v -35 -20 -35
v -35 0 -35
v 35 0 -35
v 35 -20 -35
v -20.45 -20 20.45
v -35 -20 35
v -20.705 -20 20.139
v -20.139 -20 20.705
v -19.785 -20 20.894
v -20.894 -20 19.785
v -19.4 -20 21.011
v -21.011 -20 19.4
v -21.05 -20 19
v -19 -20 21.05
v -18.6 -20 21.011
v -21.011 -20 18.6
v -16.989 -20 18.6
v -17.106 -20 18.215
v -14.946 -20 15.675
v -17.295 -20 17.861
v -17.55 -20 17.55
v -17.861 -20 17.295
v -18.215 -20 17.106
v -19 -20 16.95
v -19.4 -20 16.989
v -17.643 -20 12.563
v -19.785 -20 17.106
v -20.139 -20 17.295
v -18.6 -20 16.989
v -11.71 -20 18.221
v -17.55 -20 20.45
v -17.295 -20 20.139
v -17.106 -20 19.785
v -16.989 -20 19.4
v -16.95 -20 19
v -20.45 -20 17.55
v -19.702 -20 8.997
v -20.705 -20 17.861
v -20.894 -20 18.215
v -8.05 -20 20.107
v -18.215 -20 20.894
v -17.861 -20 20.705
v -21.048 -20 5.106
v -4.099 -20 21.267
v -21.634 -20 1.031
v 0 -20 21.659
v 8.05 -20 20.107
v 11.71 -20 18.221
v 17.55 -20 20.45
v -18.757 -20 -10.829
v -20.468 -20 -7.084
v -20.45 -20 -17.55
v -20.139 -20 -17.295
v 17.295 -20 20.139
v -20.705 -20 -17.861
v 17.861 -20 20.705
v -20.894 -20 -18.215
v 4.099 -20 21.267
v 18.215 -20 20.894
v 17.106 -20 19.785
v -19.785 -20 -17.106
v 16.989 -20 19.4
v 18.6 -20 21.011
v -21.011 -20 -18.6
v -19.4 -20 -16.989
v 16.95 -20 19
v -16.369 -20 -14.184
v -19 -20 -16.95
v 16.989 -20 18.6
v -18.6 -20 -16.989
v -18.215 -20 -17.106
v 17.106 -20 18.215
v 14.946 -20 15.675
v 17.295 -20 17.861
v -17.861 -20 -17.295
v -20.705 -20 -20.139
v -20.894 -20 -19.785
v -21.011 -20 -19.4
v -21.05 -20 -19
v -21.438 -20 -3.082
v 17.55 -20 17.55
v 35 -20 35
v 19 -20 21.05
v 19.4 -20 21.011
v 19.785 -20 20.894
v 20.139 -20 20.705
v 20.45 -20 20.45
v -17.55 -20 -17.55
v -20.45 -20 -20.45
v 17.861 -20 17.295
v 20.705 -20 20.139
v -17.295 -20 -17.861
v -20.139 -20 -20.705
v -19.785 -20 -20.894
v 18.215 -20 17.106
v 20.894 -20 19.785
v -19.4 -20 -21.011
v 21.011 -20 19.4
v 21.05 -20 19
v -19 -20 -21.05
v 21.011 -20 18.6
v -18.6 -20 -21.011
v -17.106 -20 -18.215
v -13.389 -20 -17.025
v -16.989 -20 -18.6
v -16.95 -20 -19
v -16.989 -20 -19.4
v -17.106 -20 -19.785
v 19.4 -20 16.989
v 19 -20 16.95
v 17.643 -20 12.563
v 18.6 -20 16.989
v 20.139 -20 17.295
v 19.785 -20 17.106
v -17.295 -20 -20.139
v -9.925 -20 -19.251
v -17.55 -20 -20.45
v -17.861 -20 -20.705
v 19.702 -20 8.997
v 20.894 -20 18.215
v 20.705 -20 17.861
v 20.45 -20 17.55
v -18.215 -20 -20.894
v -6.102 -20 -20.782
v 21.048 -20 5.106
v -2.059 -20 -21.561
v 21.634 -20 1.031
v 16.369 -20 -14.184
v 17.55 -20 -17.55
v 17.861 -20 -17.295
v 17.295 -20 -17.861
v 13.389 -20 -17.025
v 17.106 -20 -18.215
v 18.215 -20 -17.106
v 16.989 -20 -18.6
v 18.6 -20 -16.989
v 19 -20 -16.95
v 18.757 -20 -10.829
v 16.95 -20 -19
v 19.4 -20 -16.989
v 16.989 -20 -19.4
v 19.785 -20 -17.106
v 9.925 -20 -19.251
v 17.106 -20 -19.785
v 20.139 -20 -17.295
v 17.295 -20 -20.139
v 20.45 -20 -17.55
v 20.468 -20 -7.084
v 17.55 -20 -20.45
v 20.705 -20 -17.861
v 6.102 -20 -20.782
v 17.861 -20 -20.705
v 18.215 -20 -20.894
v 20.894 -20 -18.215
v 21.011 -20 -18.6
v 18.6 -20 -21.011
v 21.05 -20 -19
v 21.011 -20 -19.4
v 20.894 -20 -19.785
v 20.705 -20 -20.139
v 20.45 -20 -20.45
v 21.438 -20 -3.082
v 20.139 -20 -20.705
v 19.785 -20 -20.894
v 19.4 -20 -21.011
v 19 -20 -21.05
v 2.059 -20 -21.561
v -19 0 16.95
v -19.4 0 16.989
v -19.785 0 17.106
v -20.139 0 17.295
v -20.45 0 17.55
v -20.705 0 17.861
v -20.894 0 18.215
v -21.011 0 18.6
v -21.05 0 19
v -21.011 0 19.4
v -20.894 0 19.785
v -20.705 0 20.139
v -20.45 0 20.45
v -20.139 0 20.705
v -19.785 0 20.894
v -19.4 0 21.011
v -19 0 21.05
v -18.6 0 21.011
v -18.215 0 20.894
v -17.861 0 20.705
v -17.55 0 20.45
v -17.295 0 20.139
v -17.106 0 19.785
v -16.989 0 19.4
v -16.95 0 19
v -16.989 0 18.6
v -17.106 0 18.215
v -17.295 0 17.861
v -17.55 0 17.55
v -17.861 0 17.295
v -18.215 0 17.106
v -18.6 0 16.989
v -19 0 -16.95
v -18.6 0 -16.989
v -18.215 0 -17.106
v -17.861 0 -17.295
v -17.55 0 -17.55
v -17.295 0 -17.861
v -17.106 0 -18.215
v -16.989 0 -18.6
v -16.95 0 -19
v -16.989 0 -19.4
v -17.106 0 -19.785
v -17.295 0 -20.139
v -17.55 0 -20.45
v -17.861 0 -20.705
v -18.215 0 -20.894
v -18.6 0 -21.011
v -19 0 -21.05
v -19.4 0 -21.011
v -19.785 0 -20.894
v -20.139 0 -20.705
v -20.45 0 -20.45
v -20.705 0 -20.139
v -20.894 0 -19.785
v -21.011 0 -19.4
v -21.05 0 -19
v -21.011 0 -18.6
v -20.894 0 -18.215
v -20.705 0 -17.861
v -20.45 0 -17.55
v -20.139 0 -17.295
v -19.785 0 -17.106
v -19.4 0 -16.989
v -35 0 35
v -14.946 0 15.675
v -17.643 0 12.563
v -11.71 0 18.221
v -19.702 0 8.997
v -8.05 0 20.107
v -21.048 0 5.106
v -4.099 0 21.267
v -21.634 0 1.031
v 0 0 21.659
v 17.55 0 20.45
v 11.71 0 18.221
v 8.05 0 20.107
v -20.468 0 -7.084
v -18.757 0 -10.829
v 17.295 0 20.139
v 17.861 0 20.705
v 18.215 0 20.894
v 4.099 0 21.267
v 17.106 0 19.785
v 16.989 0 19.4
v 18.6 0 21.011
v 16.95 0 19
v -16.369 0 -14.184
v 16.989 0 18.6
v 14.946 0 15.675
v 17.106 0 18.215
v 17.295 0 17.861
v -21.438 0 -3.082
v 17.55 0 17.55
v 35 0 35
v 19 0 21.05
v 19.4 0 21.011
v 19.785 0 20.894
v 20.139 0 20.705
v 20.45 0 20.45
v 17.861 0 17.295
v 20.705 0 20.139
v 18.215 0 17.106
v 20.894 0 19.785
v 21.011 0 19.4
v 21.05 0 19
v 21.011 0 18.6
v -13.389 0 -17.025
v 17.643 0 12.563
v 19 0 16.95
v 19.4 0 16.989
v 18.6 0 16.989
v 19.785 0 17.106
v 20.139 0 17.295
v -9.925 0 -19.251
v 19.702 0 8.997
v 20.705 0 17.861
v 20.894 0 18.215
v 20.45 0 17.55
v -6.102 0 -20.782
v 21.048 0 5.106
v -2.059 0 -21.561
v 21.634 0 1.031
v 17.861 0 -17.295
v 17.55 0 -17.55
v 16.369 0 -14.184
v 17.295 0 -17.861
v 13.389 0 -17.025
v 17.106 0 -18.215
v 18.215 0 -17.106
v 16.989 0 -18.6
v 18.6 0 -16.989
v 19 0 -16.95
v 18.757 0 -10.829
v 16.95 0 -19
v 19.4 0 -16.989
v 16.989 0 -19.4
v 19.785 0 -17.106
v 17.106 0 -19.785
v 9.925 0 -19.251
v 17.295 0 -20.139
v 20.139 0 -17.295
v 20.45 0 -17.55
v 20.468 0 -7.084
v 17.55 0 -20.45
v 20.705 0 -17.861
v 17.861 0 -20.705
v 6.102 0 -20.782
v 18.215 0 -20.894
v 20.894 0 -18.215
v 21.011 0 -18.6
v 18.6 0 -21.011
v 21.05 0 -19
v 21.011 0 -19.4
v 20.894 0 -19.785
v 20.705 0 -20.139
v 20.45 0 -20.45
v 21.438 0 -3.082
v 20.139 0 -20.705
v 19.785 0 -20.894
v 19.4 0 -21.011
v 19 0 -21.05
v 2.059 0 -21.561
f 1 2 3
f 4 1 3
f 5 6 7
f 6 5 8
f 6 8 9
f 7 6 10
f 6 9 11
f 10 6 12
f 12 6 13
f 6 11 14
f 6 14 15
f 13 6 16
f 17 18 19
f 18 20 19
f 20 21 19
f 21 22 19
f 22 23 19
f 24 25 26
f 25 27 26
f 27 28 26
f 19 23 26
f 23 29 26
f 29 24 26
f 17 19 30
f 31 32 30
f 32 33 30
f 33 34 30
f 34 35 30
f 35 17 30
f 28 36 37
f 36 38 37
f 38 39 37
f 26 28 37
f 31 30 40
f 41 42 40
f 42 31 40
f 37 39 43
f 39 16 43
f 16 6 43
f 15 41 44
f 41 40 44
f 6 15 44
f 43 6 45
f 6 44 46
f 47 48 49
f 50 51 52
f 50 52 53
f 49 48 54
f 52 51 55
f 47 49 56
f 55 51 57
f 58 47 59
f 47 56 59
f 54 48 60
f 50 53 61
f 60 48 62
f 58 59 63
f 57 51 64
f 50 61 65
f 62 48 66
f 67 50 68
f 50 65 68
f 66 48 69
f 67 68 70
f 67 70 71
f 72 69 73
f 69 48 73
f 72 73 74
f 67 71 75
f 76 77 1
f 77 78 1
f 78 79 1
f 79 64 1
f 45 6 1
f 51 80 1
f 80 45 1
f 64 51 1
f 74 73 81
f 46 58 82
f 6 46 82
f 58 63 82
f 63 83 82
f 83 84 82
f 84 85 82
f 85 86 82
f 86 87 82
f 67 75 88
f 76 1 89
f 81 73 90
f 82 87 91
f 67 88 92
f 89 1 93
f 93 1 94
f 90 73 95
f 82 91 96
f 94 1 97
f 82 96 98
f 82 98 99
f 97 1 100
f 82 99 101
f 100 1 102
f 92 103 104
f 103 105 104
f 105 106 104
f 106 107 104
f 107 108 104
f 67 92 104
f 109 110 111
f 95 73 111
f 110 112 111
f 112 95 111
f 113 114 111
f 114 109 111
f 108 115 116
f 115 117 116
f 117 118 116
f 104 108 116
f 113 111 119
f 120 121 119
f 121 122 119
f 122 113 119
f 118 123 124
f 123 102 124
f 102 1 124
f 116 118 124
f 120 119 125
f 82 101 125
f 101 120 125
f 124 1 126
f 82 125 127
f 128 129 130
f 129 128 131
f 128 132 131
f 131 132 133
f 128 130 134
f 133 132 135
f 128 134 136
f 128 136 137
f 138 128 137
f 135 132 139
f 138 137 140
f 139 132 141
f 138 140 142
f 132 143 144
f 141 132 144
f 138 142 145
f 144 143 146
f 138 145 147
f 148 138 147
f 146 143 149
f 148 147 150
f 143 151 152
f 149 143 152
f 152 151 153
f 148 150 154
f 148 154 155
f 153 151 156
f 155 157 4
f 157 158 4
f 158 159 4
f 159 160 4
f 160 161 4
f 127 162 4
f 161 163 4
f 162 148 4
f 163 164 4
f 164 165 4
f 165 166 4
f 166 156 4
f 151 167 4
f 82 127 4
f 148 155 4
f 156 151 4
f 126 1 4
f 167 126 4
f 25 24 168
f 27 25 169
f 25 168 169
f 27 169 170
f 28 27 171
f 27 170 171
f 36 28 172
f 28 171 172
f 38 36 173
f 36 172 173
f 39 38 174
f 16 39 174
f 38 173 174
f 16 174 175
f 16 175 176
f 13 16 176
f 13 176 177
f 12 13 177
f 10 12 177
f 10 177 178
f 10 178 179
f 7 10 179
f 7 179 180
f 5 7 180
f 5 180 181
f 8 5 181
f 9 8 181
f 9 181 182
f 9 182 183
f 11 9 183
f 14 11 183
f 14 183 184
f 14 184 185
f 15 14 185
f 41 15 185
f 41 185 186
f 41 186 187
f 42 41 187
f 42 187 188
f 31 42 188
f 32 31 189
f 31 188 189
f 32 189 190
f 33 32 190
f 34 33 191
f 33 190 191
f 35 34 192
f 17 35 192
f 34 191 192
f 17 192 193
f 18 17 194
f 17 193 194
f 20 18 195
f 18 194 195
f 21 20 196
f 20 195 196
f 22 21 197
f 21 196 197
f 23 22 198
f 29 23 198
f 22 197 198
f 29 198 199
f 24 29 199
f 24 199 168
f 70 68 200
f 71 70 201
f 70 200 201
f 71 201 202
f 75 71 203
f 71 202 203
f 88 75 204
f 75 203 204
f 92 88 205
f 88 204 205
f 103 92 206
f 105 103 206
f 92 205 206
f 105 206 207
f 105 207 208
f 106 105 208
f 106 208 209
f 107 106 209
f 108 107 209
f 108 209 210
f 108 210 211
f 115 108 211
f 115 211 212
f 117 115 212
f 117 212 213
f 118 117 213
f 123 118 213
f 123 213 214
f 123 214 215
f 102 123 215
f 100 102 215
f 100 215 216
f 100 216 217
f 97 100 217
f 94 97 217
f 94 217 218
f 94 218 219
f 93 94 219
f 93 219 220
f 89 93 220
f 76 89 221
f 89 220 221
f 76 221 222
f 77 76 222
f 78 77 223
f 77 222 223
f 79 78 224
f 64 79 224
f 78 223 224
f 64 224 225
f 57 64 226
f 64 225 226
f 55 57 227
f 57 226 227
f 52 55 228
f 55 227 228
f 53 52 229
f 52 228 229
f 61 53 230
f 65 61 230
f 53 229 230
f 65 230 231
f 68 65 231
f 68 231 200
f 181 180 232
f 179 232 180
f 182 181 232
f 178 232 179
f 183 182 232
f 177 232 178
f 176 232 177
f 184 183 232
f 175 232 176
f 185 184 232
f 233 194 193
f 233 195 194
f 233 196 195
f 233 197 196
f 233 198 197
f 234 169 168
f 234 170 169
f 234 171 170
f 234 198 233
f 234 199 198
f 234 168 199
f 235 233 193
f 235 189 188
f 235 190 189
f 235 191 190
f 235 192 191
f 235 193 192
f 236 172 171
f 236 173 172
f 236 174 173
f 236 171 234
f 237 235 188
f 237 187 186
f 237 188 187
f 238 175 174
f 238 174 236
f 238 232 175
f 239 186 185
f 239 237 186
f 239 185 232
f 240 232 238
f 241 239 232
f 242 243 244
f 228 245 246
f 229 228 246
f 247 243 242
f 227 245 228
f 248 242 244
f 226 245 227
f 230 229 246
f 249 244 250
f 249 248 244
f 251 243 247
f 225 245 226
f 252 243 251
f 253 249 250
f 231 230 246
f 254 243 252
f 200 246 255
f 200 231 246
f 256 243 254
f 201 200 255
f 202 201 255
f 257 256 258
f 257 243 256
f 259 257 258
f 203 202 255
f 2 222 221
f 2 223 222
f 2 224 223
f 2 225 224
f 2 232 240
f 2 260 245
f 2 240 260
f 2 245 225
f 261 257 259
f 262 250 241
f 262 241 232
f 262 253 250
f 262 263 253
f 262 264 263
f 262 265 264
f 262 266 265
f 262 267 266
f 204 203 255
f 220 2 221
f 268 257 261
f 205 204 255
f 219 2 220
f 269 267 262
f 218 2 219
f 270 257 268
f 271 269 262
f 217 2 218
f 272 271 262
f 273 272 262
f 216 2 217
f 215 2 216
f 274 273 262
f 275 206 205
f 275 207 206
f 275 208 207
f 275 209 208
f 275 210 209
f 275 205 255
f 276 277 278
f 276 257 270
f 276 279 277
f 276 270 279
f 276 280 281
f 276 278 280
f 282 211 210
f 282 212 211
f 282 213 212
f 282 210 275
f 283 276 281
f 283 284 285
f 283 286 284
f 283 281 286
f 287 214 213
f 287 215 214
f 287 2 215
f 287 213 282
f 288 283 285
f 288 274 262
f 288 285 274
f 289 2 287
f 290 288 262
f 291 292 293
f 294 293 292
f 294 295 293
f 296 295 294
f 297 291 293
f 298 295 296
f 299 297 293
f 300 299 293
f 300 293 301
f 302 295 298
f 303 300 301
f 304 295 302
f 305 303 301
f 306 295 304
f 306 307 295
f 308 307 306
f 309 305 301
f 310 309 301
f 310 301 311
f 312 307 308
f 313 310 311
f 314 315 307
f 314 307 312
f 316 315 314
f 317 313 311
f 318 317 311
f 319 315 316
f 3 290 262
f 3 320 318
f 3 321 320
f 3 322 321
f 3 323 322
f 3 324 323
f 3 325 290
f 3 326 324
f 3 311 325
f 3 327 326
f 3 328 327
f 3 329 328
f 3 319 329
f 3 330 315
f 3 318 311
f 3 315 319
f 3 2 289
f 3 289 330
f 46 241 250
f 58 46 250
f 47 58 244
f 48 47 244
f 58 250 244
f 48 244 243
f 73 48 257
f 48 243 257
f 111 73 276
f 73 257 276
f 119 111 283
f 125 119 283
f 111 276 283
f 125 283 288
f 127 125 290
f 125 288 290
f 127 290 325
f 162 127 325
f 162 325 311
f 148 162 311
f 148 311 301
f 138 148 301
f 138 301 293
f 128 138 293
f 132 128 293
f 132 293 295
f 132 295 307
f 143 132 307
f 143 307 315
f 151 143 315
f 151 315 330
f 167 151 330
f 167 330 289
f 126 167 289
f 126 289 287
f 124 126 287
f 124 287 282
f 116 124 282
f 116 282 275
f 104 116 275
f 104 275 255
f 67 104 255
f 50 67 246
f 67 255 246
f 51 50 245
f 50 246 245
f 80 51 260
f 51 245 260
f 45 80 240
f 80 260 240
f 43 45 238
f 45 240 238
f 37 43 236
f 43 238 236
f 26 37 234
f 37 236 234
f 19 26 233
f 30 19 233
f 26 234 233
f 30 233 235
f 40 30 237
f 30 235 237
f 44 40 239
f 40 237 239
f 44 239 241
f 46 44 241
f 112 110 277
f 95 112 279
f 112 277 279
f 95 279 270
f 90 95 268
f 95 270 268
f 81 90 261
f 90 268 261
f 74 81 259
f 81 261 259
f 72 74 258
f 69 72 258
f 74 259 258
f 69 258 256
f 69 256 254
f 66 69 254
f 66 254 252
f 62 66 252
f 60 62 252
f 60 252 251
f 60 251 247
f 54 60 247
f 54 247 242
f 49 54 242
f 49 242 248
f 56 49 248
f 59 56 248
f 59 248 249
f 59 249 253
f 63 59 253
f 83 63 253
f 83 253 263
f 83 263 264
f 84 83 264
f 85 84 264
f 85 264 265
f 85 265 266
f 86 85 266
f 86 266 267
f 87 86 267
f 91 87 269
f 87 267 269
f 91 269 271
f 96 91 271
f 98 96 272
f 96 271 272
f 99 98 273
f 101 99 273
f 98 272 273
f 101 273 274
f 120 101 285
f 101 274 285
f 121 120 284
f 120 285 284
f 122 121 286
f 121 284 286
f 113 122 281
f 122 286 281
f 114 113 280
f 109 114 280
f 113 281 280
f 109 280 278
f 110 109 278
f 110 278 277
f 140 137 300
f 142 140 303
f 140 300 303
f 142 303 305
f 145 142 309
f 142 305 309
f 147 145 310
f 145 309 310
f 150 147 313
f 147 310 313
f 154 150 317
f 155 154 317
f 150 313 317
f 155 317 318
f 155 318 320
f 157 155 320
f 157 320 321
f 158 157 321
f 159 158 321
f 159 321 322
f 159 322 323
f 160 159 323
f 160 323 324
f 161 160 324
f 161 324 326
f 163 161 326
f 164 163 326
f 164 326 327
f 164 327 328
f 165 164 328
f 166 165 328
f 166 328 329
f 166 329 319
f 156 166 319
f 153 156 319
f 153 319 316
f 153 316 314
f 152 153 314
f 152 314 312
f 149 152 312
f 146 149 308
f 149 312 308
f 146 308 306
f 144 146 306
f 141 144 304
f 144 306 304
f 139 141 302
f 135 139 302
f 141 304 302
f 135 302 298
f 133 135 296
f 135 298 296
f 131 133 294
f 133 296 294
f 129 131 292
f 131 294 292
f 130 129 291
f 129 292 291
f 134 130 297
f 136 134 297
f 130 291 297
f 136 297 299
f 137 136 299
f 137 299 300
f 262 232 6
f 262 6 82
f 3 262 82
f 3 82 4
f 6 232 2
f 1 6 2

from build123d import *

# Parameters (mm, degrees)
SKETCH2_W           = 70
SKETCH2_H           = 70
BOSS_EXTRUDE1_DEPTH = 20
SKETCH3_R           = 2.05
CUT_EXTRUDE1_DEPTH  = 54.38539126
SKETCH4_R           = 21.658851084
CUT_EXTRUDE2_DEPTH  = 54.38539126


with BuildPart() as part:
    # Sketch2 → Boss-Extrude1 (new body)
    with BuildSketch(Plane(origin=(0, 0, 0), x_dir=(1, 0, 0), z_dir=(0, 1, 0))):
        Rectangle(SKETCH2_W, SKETCH2_H)
    extrude(amount=-BOSS_EXTRUDE1_DEPTH)

    # Sketch1 → Cut-Revolve1 (revolve, cut)
    with BuildSketch(Plane.XY, mode=Mode.PRIVATE) as cut_revolve1_sk:
        with BuildLine():
            Line((0, -17.2), (0, 0))
            Line((0, 0), (21.241684944, 0))
            Line((21.241684944, 0), (21.158851084, -0.511526958))
            add(Edge.make_bspline(
                [(0, -17.2), (0.530678283, -17.2), (1.61157482, -17.183508716), (3.615531125, -17.08588663), (5.944127269, -16.844919371), (8.44843367, -16.370131279), (11.442656399, -15.492934033), (14.579654851, -13.93724298), (17.382164488, -11.402739011), (19.199009229, -8.500896664), (20.23569058, -5.583194157), (20.706490619, -3.313387562), (20.981886079, -1.635929169), (21.096876841, -0.894238762), (21.158851084, -0.511526958)],
                knots=[0, 0, 0, 0, 0.03125, 0.0625, 0.125, 0.1875, 0.25, 0.375, 0.5, 0.625, 0.75, 0.875, 0.9375, 1, 1, 1, 1], degree=3))
        make_face()
    revolve(cut_revolve1_sk.sketch.rotate(Axis((0, -17.2, 0), (0, 1, 0)), 90), axis=Axis((0, -17.2, 0), (0, 1, 0)), mode=Mode.SUBTRACT)

    # Sketch3 → Cut-Extrude1 (cut, through all)
    with BuildSketch(Plane(origin=(0, 0, 0), x_dir=(1, 0, 0), z_dir=(0, 1, 0))):
        with Locations(Location((-19, 19, 0), (0, 0, 270))):
            Circle(SKETCH3_R)
        with Locations(Location((19, -19, 0), (0, 0, 90))):
            Circle(SKETCH3_R)
        with Locations(Location((-19, -19, 0), (0, 0, 90))):
            Circle(SKETCH3_R)
        with Locations(Location((19, 19, 0), (0, 0, 270))):
            Circle(SKETCH3_R)
    extrude(amount=-CUT_EXTRUDE1_DEPTH, mode=Mode.SUBTRACT)

    # Sketch4 → Cut-Extrude2 (cut, through all)
    with BuildSketch(Plane(origin=(0, 0, 0), x_dir=(1, 0, 0), z_dir=(0, 1, 0))):
        with Locations(Location((0, 0, 0), (0, 0, 270))):
            Circle(SKETCH4_R)
    extrude(amount=-CUT_EXTRUDE2_DEPTH, mode=Mode.SUBTRACT)


solid = part.part
